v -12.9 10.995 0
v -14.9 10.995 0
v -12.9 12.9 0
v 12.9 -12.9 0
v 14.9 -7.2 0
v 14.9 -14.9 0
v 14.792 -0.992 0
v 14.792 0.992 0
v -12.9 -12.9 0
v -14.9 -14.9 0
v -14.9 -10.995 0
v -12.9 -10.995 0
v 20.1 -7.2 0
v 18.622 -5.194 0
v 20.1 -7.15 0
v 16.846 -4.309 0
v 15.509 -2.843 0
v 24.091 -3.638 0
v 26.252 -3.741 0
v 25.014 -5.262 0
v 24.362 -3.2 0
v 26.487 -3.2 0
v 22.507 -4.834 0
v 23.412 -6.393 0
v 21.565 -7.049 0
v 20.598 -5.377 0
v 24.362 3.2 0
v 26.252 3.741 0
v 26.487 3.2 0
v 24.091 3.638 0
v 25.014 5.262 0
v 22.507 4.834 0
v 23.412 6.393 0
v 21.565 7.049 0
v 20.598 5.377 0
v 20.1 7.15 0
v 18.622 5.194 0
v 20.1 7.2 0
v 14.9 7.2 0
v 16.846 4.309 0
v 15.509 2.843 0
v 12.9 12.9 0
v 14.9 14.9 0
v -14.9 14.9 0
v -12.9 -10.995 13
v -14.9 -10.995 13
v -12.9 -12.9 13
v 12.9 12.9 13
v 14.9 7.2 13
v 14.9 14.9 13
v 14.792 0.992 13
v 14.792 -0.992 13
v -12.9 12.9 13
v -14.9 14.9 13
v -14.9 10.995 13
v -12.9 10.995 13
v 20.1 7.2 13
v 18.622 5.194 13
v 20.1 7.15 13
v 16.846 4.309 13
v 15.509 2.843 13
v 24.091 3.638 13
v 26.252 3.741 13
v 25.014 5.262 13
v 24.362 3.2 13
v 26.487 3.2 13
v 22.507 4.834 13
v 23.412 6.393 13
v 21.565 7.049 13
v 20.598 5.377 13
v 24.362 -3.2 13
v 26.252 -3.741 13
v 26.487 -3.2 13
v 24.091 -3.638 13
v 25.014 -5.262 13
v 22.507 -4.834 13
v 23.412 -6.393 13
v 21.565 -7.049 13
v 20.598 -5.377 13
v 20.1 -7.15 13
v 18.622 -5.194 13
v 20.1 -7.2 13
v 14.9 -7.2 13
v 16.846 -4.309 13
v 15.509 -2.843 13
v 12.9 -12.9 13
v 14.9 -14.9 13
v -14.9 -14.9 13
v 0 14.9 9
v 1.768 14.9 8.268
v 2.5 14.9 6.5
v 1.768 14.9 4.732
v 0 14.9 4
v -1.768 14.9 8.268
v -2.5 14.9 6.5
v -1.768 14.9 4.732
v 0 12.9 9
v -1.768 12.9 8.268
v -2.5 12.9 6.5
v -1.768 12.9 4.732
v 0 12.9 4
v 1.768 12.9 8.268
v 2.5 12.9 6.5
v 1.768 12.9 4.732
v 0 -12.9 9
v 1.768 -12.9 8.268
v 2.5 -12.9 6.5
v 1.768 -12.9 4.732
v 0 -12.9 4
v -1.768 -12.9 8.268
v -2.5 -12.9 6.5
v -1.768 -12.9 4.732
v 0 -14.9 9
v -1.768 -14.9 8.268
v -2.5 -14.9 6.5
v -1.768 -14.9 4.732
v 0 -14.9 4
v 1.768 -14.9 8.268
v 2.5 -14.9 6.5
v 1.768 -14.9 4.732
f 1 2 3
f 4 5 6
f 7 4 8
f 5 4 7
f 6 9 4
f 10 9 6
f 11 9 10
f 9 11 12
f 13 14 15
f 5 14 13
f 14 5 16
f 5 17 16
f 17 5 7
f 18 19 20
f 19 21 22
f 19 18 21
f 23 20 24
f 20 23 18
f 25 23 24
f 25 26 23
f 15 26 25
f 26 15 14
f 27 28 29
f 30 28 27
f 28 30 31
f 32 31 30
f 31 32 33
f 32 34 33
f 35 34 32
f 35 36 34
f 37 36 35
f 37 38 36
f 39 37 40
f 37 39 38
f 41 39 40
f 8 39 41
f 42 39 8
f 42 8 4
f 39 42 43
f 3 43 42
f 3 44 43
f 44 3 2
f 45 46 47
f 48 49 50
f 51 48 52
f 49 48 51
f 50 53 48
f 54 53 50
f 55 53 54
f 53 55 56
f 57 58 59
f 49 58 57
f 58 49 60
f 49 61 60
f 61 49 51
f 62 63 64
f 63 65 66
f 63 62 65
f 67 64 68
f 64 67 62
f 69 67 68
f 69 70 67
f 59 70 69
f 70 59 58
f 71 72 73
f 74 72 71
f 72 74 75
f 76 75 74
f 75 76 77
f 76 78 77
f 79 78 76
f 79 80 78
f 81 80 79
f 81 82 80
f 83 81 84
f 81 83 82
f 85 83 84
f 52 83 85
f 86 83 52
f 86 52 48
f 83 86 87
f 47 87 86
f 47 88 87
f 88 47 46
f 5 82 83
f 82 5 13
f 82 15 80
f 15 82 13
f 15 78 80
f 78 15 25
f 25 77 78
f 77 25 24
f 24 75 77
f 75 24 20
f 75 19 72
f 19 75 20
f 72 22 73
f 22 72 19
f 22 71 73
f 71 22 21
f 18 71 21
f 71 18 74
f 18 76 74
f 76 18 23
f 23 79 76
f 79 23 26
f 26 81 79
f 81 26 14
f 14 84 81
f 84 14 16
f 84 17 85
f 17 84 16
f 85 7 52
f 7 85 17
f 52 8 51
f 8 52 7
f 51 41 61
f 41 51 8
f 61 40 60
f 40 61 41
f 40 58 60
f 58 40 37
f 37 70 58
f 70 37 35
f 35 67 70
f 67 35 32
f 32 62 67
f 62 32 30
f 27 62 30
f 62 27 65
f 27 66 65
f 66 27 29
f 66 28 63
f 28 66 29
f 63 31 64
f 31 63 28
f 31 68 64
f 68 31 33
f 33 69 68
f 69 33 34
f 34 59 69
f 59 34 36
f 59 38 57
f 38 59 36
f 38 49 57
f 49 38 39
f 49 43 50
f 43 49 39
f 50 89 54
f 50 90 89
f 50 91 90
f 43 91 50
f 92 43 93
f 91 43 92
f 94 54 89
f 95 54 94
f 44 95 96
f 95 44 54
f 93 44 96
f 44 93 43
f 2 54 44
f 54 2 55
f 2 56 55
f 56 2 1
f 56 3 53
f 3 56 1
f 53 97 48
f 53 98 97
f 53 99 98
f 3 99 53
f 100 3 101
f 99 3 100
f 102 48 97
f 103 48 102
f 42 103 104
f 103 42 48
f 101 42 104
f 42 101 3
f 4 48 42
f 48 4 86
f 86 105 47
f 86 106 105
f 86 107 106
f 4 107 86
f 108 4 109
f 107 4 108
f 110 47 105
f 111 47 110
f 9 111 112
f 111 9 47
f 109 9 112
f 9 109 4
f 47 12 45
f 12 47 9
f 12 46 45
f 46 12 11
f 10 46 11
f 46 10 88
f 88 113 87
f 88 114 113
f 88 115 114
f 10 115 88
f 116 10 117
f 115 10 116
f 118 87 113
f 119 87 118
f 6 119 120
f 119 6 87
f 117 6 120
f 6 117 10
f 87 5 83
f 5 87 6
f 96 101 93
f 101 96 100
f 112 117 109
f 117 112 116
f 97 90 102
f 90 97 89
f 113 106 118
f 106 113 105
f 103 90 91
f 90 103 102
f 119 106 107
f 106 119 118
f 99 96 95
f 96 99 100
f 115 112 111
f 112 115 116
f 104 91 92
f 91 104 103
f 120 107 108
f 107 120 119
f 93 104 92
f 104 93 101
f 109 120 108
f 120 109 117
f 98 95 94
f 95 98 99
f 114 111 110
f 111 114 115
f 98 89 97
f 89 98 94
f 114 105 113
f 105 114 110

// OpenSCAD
// Shape of the object the clip attaches to?
shape=0; // [0:rectangle, 1:circle, 2:open_rectangle]
// Size of the object the clip attaches to (mm)
clipSize = 25.4;
// Relative size of the main opening of the clip
mainOpeningWidthPercent = 0.85;
// Diameter of the cable/tube/hose/round thing going in the other side (mm)
cableDiameter = 10.0;
// Size of opening on cable clip loop (mm) (smallest size opening that cable can fit through) - if unsure, try cableDiameter-1mm for small cables
cableOpeningWidth = 6.0;
// Height/length/thickness of the clip (mm)
height = 13.0;
// Wall thickness of the clip (mm)
thickness = 2;
// Add a hole on the side for screwing or riveting onto things? (mm)
holeDiameter=5;
// Create internal tabs for clipping into aluminum extrusion?
internalTabs=0; // [0:no, 1:yes]
// Depth of tabs for clipping into aluminum extrusion (mm)
tabDepth = 1.0;
// Width of tabs (mm)
tabWidth = 2.5;
// Additional clearance to add to internal openings (mm)
clearance = 0.2;

module rect_base() {
    union() {
        difference() {
            square([clipSize + 2*clearance + 2*thickness, clipSize + 2*clearance + 2*thickness], center=true);
            square([clipSize + 2*clearance, clipSize + 2*clearance], center=true);
            translate([-clipSize/2, 0]) square([clipSize + 2*clearance, mainOpeningWidthPercent * clipSize + 2*clearance], center=true);
        }
        
        if (internalTabs == 1) {
            translate([0, clipSize/2 + clearance - tabDepth/2]) square([tabWidth, tabDepth], center=true);
            translate([0, -clipSize/2 - clearance + tabDepth/2]) square([tabWidth, tabDepth], center=true);
        }
    
        translate([clipSize/2 + 2*clearance + thickness + cableDiameter/2, 0]) circle(cableDiameter/2 + clearance + thickness, 50);
        translate([(clipSize/2 + 2*clearance + thickness + cableDiameter/2) - (cableDiameter/2 + thickness)/2, 0]) square([(cableDiameter/2 + thickness), min(cableDiameter, clipSize) + 2*clearance + 2*thickness], center=true);
    }
}

module circle_base() {
    union() {
        difference() {
            union() {
                circle(clipSize/2 + clearance + thickness, 50);
                translate([((cableDiameter/2 + clipSize/2) + thickness)/2, 0]) square([(cableDiameter/2 + clipSize/2) + thickness, min(cableDiameter, clipSize) + 2*clearance + 2*thickness], center=true);
            }
            circle(clipSize/2 + clearance , 50);
            translate([-clipSize/2, 0]) square([clipSize + 2*clearance, mainOpeningWidthPercent * clipSize + 2*clearance], center=true);
        }
        
        if (internalTabs == 1) {
            translate([0, clipSize/2 + clearance - tabDepth/2]) square([tabWidth, tabDepth], center=true);
            translate([0, -clipSize/2 - clearance + tabDepth/2]) square([tabWidth, tabDepth], center=true);
        }
        
        translate([clipSize/2 + 2*clearance + thickness + cableDiameter/2, 0]) circle(cableDiameter/2 + clearance + thickness, 50);   
    }
}

difference() {
    linear_extrude(height=height) {
        if (shape == 0) {
            difference() {
                rect_base();
                translate([clipSize/2 + 2*clearance + thickness + cableDiameter/2, 0]) circle(cableDiameter/2 + 2*clearance, 50);
                if (cableOpeningWidth > 0) {
                    translate([(clipSize/2 + 2*clearance + thickness + cableDiameter/2) + (cableDiameter/2 + 2*clearance + thickness)/2, 0]) square([cableDiameter/2 + 2*clearance + thickness, cableOpeningWidth + 2*clearance], center=true);
                }
            }
        } else if (shape == 1) {
            difference() {
                circle_base();
                translate([clipSize/2 + 2*clearance + thickness + cableDiameter/2, 0]) circle(cableDiameter/2 + 2*clearance, 50);
                if (cableOpeningWidth > 0) {
                    translate([(clipSize/2 + 2*clearance + thickness + cableDiameter/2) + (cableDiameter/2 + 2*clearance + thickness)/2, 0]) square([cableDiameter/2 + 2*clearance + thickness, cableOpeningWidth + 2*clearance], center=true);
                }
            }
        } else if (shape == 2) {
            difference() {
                rect_base();
                translate([clipSize/2 + 2*clearance + thickness + cableDiameter/2, 0]) circle(cableDiameter/2 + 2*clearance, 50);
                if (cableOpeningWidth > 0) {
                    translate([(clipSize/2 + 2*clearance + thickness + cableDiameter/2) - (cableDiameter/2 + 2*clearance + thickness)/2, 0]) square([cableDiameter/2 + 2*clearance + thickness, cableOpeningWidth + 2*clearance], center=true);
                }
            }
        }
    }
    
    if (holeDiameter > 0) {
        translate([0, (clipSize + 2*clearance + 2*thickness + 2)/2, height/2]) rotate(a=[90, 0, 0]) linear_extrude(height=(clipSize + 2*clearance + 2*thickness + 2)) {
            circle(holeDiameter/2, 50);
        }
    }
}
